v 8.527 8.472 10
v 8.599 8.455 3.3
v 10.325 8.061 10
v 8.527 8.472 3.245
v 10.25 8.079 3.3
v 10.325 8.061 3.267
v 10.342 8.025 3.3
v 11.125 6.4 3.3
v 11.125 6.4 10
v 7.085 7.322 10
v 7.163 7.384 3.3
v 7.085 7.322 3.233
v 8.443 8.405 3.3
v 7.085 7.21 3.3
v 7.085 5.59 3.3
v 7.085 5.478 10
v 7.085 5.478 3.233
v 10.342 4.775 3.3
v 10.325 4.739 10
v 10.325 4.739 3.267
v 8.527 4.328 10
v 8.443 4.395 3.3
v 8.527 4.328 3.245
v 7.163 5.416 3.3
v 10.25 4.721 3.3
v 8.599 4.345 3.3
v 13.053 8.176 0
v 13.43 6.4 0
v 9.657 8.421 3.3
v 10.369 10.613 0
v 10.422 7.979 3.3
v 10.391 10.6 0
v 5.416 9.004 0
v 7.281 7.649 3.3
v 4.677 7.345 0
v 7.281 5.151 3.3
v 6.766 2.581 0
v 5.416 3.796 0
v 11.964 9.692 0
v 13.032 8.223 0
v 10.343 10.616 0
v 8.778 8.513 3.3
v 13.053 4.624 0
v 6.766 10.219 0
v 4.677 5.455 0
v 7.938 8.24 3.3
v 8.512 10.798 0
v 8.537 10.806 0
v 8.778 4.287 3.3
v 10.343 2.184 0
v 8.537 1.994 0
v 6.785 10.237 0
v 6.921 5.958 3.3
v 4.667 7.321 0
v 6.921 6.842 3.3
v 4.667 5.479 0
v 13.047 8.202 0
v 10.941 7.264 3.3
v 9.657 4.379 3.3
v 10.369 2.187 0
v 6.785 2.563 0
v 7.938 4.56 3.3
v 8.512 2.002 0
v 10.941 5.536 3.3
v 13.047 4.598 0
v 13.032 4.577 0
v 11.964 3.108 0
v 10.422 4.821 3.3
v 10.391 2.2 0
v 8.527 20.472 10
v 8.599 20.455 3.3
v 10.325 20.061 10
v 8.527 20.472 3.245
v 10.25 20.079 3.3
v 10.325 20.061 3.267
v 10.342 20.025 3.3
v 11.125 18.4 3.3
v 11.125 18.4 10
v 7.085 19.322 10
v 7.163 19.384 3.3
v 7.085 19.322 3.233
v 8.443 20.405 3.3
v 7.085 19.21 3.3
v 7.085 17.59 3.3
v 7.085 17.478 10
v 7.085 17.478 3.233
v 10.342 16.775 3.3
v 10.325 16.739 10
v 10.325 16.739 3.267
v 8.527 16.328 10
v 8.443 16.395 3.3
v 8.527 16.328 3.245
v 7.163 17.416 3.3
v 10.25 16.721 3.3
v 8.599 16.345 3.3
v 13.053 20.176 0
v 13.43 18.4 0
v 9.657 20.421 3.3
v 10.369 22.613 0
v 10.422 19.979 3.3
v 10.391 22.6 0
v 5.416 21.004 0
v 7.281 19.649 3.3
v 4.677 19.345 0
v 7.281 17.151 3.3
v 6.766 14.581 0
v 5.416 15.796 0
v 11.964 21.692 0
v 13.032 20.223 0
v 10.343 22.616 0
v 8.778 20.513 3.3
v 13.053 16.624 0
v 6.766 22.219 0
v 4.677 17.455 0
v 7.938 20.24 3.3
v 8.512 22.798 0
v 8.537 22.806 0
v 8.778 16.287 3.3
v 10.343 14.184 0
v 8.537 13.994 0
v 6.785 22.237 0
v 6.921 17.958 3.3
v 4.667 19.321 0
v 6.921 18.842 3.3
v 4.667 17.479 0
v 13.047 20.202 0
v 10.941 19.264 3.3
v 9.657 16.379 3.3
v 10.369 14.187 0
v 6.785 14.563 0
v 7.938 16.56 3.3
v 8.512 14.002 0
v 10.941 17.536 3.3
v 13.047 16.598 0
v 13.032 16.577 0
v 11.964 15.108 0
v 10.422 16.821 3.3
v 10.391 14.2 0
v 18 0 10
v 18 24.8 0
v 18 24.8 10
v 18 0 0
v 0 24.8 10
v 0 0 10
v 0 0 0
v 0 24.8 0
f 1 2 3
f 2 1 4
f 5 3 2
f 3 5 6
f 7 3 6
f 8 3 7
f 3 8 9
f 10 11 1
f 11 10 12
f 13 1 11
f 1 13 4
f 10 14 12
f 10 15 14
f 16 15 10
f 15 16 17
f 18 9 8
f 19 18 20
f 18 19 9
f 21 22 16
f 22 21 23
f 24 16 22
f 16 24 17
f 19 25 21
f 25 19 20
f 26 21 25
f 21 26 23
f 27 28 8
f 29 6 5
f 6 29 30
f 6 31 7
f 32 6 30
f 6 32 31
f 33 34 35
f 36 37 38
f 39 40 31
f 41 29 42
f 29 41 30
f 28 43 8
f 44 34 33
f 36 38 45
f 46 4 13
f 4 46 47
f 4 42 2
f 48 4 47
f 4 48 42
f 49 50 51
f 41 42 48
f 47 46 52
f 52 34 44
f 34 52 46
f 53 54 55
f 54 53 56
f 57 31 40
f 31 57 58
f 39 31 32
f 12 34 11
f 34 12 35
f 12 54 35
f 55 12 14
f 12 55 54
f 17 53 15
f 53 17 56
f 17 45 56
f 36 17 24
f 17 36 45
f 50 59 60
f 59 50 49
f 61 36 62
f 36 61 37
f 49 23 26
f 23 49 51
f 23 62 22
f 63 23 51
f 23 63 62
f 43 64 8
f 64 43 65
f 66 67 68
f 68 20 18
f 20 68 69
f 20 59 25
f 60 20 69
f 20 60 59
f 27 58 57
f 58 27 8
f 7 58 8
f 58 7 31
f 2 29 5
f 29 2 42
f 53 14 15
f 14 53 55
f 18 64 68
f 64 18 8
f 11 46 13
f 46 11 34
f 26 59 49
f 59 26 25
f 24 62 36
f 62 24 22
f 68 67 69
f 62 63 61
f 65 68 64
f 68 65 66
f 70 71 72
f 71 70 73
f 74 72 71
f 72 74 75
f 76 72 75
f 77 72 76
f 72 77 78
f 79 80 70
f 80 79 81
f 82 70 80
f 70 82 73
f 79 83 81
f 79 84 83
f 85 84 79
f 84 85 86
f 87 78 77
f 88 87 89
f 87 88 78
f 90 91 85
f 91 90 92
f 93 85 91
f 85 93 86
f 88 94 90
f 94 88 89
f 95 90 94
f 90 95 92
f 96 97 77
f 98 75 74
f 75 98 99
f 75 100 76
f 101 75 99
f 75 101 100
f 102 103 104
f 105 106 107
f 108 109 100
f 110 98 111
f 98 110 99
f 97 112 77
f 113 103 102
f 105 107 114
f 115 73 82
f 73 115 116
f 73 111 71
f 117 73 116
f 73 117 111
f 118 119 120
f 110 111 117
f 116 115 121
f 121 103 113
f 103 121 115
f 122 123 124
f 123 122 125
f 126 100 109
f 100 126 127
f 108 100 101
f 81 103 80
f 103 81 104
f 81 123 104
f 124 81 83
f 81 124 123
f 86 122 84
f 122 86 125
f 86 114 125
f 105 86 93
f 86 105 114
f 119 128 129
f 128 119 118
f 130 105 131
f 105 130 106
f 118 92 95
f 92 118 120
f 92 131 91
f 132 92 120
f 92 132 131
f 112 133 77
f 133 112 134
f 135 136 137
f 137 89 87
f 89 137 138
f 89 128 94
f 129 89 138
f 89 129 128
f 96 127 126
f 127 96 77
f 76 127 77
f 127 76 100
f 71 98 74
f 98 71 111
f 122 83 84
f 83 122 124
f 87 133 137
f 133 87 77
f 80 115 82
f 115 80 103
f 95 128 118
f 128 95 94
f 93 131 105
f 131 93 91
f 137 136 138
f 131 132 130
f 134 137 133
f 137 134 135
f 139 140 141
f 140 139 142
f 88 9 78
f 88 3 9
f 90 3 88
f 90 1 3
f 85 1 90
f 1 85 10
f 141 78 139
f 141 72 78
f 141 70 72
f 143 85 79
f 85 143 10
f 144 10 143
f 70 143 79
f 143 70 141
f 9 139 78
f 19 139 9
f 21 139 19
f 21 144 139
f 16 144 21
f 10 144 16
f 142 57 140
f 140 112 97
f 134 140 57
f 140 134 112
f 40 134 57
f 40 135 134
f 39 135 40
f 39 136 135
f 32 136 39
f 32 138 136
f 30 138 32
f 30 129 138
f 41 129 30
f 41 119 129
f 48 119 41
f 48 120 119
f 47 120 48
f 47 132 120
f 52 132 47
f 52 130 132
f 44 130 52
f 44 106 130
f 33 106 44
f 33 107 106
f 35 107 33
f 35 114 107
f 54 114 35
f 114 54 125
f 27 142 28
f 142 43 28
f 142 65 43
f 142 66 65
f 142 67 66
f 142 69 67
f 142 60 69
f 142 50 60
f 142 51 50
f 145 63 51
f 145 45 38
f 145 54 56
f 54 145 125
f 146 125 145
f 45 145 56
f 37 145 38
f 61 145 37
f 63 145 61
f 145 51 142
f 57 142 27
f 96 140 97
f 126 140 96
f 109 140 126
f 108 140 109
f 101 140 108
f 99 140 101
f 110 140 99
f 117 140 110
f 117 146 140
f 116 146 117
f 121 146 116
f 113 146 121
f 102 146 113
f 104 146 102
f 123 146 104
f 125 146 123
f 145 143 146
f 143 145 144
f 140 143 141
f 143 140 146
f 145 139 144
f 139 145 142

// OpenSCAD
// 3D printed mounting parts for a 74 x 18 mm multiplex strip between two U-rails.
// Axes follow the cart convention: X across the rack, Y front/back, Z vertical.
// Open this file directly in OpenSCAD and choose the part in the Customizer.

/* [Standalone preview] */
part = "lower"; // [lower:Lower insert, upper_4mm:Upper saddle 4 mm, upper_3mm:Upper saddle 3 mm under rail, both:Lower + upper 4 mm]

/* [Common] */
mount_width = 18;
screw_diameter = 4.25;
screw_head_diameter = 9;
screw_head_height = 3.2;

/* [Lower insert] */
lower_insert_depth = 24.8;
lower_insert_height = 10;
lower_screw_spacing = 12;

/* [Upper saddle] */
rail_depth = 30;
rail_height = 30;
saddle_clearance = 0.1; // clearance per side around the 30 mm steel U-profile
saddle_wall = 5;
saddle_bottom = 4;
saddle_bottom_alt = 3; // alternative: only the area directly under the steel U-rail is 3 mm
saddle_wrap_height = 20;
saddle_lip_depth = 16;
saddle_lip_thickness = 4;
saddle_inner_fillet = 1.2;
saddle_outer_fillet = 3;
saddle_bottom_relief_diameter = 6.0;
saddle_bottom_relief_depth = 0.2; // shallow print relief on the NON-countersunk face

// Rounded rectangular prism with its long axis in X.
// Used for the saddle so the Y/Z cross-section can have printable fillets.
module rounded_prism_x(size_x, size_y, size_z, radius) {
    r = min(radius, min(size_y, size_z) / 2);

    if (r <= 0) {
        cube([size_x, size_y, size_z]);
    } else {
        hull() {
            for (y = [r, size_y - r])
                for (z = [r, size_z - r])
                    translate([0, y, z])
                        rotate([0, 90, 0])
                            cylinder(h = size_x, r = r);
        }
    }
}

// Countersunk through-hole along Z, with the countersink on the TOP face.
module countersunk_z_hole(h, shaft_d = 4.25, head_d = 9, head_h = 3.2) {
    translate([0, 0, -0.1])
        cylinder(h = h + 0.2, d = shaft_d);

    translate([0, 0, h - head_h])
        cylinder(h = head_h + 0.2, d1 = shaft_d, d2 = head_d);
}

// Countersunk through-hole along Z, with the countersink on the BOTTOM face.
// Kept separate from countersunk_z_hole() so the through bore cannot be lost
// by rotating a subtraction volume around the wrong reference plane.
module countersunk_z_hole_from_bottom(h, shaft_d = 4.25, head_d = 9, head_h = 3.2) {
    translate([0, 0, -0.1])
        cylinder(h = h + 0.2, d = shaft_d);

    translate([0, 0, -0.1])
        cylinder(h = head_h + 0.2, d1 = head_d, d2 = shaft_d);
}

// Lower insert: sits inside the open channel of the lower steel U-profile.
// Two countersunk screws run upward through the insert into the underside of the multiplex strip.
module lower_rail_insert(
    size_x = 30,
    size_y = 26,
    size_z = 26,
    screw_d = 4.25,
    head_d = 9,
    head_h = 3.2,
    screw_spacing = 14
) {
    difference() {
        cube([size_x, size_y, size_z]);

        // With an 18 mm wide multiplex strip there is not enough X width
        // for two Ø9 mm countersinks side-by-side. Put the two screws along
        // the 24.8 mm rail-channel direction instead.
        for (y = [size_y/2 - screw_spacing/2,
                  size_y/2 + screw_spacing/2])
            translate([size_x/2, y, 0])
                // Countersink is on the bottom face. The shaft runs through
                // the complete 10 mm insert into the underside of the strip.
                countersunk_z_hole_from_bottom(
                    size_z,
                    screw_d,
                    head_d,
                    head_h
                );
    }
}

// Upper saddle: a larger U that fits OUTSIDE the complete upper steel U-profile.
// The mounting lips/base remain 4 mm thick. `bottom` controls only the local
// thickness directly underneath the steel U-rail. This allows a 4 mm standard
// version and a 3 mm rail-seat version to compensate for variation between
// the cart arms, while the underside against the wood stays on the same plane.
module upper_rail_saddle(
    body_x = 33,
    rail_depth = 30,
    rail_height = 30,
    clearance = 0.6,
    wall = 5,
    bottom = 4,
    wrap_height = 10,
    lip_depth = 16,
    lip_thickness = 4,
    screw_d = 4.25,
    head_d = 9,
    head_h = 3.2,
    inner_fillet = 1.2,
    outer_fillet = 3,
    bottom_relief_d = 6.0,
    bottom_relief_h = 0.2
) {
    inside_y = rail_depth + 2 * clearance;
    // The saddle only needs short locating arms along the lower part of the
    // steel U-profile. It does not need to cover the full 30 mm rail height.
    inside_z = wrap_height + clearance;
    outer_y = inside_y + 2 * wall;
    outer_z = bottom + wrap_height;

    difference() {
        union() {
            // Main U body. Keep the OUTER lower corners square: the larger
            // fillet belongs at the transition from each U leg into its
            // mounting lip, not underneath the U leg.
            // The rounded cavity retains the small inside fillet requested
            // where the upper rail approaches the thick printed bottom.
            difference() {
                cube([body_x, outer_y, outer_z]);

                translate([-0.1, wall, bottom])
                    rounded_prism_x(
                        body_x + 0.2,
                        inside_y,
                        inside_z + inner_fillet + 1,
                        inner_fillet
                    );
            }

            // Two mounting lips on the outside of the U bottom.
            translate([0, -lip_depth, 0])
                cube([body_x, lip_depth, lip_thickness]);
            translate([0, outer_y, 0])
                cube([body_x, lip_depth, lip_thickness]);

            // Larger concave fillets at the U-leg -> side-lip transitions.
            // These add material above each lip and are tangent to both the
            // vertical U wall and the horizontal top of the lip.
            if (outer_fillet > 0) {
                r = min(outer_fillet, lip_depth);

                // Front/negative-Y lip.
                difference() {
                    translate([0, -r, lip_thickness])
                        cube([body_x, r, r]);
                    translate([-0.1, -r, lip_thickness + r])
                        rotate([0, 90, 0])
                            cylinder(h = body_x + 0.2, r = r);
                }

                // Rear/positive-Y lip.
                difference() {
                    translate([0, outer_y, lip_thickness])
                        cube([body_x, r, r]);
                    translate([-0.1, outer_y + r, lip_thickness + r])
                        rotate([0, 90, 0])
                            cylinder(h = body_x + 0.2, r = r);
                }
            }
        }

        // One countersunk screw in each lip, driven down into the top of the timber.
        // The countersink is on the TOP face. A shallow cylindrical relief is
        // added on the opposite (BOTTOM / non-countersunk) face for printing.
        for (y = [-lip_depth/2, outer_y + lip_depth/2]) {
            translate([body_x/2, y, 0])
                countersunk_z_hole(lip_thickness, screw_d, head_d, head_h);

            if (bottom_relief_h > 0 && bottom_relief_d > screw_d)
                translate([body_x/2, y, -0.1])
                    cylinder(h = bottom_relief_h + 0.1, d = bottom_relief_d);
        }
    }
}


module _rail_beam_mount_standalone() {
    if (part == "lower" || part == "both")
        lower_rail_insert(
            size_x=mount_width,
            size_y=lower_insert_depth,
            size_z=lower_insert_height,
            screw_d=screw_diameter,
            head_d=screw_head_diameter,
            head_h=screw_head_height,
            screw_spacing=lower_screw_spacing
        );

    if (part == "upper_4mm" || part == "upper_3mm" || part == "both")
        translate([part == "both" ? mount_width + 15 : 0, 0, 0])
            upper_rail_saddle(
                body_x=mount_width,
                rail_depth=rail_depth,
                rail_height=rail_height,
                clearance=saddle_clearance,
                wall=saddle_wall,
                bottom=(part == "upper_3mm" ? saddle_bottom_alt : saddle_bottom),
                wrap_height=saddle_wrap_height,
                lip_depth=saddle_lip_depth,
                lip_thickness=saddle_lip_thickness,
                screw_d=screw_diameter,
                head_d=screw_head_diameter,
                head_h=screw_head_height,
                inner_fillet=saddle_inner_fillet,
                outer_fillet=saddle_outer_fillet,
                bottom_relief_d=saddle_bottom_relief_diameter,
                bottom_relief_h=saddle_bottom_relief_depth
            );
}

// Standalone component preview/render.
_rail_beam_mount_standalone();
